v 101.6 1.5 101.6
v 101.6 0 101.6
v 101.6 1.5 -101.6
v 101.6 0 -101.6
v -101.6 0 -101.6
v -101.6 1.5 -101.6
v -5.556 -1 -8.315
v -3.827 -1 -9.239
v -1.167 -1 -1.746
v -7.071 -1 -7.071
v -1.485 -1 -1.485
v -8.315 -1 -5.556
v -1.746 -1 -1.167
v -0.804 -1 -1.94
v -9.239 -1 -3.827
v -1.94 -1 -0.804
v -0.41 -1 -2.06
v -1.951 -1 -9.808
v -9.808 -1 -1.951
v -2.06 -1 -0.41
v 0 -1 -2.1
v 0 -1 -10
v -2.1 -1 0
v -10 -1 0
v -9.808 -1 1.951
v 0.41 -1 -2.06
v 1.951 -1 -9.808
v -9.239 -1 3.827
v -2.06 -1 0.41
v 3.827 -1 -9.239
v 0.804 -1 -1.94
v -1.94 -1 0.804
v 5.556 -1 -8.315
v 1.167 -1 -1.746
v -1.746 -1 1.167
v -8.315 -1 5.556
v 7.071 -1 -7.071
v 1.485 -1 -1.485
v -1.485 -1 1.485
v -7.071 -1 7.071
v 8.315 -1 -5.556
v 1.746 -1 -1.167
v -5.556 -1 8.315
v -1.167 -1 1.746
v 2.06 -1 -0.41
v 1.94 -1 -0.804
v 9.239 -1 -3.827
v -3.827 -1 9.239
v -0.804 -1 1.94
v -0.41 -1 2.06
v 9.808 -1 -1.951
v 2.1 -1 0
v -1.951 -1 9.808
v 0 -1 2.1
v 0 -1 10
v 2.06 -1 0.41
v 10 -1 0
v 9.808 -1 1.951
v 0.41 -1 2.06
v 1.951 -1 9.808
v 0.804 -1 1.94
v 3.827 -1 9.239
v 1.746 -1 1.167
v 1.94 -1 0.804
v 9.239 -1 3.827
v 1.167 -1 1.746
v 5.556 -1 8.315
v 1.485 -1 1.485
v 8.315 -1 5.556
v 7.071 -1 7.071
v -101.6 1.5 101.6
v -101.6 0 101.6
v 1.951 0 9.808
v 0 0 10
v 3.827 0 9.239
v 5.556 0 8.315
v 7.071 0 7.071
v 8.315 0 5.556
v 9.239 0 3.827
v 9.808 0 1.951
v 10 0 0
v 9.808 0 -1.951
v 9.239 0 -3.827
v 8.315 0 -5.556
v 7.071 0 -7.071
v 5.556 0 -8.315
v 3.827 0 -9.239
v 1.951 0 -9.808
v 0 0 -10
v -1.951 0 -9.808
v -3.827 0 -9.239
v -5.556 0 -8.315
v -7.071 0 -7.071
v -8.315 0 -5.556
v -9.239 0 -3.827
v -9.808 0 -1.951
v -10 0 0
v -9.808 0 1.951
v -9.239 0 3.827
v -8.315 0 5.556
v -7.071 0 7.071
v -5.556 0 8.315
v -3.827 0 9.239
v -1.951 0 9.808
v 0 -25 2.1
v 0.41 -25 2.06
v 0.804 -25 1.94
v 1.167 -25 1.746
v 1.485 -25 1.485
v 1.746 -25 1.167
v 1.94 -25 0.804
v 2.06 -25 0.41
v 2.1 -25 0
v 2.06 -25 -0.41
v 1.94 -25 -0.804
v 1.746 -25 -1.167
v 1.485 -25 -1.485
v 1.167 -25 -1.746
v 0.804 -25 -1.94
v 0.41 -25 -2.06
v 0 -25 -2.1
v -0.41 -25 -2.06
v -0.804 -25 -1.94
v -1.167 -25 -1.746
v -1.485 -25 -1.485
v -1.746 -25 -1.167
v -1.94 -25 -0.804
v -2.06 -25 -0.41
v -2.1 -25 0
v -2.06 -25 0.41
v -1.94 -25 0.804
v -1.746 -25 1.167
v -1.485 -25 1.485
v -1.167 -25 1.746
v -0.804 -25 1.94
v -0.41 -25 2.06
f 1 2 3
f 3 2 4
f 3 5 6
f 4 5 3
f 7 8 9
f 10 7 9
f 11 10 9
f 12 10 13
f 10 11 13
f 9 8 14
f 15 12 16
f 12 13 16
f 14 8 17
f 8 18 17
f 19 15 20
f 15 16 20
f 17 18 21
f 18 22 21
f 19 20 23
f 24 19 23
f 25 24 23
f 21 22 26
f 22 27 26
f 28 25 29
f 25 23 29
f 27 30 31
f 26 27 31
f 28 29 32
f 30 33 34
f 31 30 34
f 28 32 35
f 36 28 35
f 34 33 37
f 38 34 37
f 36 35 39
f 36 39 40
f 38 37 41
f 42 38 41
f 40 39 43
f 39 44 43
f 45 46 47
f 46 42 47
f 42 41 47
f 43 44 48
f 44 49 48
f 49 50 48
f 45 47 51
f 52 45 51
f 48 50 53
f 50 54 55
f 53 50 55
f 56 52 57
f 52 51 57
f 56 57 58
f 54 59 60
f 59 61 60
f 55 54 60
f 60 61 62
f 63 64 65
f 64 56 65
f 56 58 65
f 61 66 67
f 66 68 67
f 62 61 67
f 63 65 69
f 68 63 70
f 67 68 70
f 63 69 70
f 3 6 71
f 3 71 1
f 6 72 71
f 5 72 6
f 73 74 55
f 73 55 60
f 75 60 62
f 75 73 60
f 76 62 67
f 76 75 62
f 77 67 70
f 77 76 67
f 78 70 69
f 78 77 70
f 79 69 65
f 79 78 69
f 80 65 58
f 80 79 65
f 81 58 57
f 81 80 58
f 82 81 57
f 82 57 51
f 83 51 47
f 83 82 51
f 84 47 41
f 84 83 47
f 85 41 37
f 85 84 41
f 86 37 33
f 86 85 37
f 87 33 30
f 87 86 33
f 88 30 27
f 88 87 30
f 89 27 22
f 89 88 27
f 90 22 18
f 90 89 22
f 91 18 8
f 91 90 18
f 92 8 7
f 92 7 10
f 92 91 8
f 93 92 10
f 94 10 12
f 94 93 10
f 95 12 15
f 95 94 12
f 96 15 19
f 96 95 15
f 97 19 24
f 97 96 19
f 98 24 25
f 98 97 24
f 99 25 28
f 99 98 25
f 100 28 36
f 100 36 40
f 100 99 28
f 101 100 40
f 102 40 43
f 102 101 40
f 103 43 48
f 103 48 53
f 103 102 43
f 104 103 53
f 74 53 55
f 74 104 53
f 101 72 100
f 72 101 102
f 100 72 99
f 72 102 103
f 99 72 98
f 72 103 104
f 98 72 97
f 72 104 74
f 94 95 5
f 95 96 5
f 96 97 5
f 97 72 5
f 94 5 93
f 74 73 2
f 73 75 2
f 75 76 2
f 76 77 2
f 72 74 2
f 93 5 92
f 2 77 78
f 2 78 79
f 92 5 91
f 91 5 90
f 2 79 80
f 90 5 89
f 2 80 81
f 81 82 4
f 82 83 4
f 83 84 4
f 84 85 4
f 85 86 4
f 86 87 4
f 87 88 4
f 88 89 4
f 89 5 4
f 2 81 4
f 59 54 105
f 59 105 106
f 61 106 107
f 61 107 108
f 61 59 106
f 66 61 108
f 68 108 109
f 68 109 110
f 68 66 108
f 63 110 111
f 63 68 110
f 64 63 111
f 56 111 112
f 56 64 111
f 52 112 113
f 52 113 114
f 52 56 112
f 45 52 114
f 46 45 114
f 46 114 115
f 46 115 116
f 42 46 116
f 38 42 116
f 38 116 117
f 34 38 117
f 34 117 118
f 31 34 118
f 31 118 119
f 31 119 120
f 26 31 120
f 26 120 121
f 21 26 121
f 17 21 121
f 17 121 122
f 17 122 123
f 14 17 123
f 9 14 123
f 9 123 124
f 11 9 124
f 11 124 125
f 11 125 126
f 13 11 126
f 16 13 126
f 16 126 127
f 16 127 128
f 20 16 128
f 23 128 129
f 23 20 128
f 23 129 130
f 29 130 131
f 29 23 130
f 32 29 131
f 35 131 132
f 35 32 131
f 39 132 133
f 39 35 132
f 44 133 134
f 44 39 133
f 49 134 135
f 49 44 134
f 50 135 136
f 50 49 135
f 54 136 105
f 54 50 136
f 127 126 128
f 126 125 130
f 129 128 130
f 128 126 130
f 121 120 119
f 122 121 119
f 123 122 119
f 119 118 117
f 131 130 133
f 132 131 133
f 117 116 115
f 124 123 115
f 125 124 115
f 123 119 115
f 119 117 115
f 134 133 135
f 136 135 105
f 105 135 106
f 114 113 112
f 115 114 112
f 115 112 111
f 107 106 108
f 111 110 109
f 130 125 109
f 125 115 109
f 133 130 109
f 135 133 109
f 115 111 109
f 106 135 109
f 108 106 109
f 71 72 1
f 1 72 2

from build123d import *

# Parameters (mm, degrees)
SKETCH1_R           = 2.1
BOSS_EXTRUDE1_DEPTH = 25
SKETCH2_W           = 203.2
SKETCH2_H           = 203.2
BOSS_EXTRUDE2_DEPTH = 1.5
SKETCH3_R           = 10
BOSS_EXTRUDE3_DEPTH = 1


with BuildPart() as part:
    # Sketch1 → Boss-Extrude1 (new body)
    with BuildSketch(Plane(origin=(0, 0, 0), x_dir=(1, 0, 0), z_dir=(0, 1, 0))):
        with Locations(Location((0, 0, 0), (0, 0, 270))):
            Circle(SKETCH1_R)
    extrude(amount=-BOSS_EXTRUDE1_DEPTH)

    # Sketch2 → Boss-Extrude2 (add)
    with BuildSketch(Plane(origin=(0, 0, 0), x_dir=(1, 0, 0), z_dir=(0, 1, 0))):
        Rectangle(SKETCH2_W, SKETCH2_H)
    extrude(amount=BOSS_EXTRUDE2_DEPTH)

    # Sketch3 → Boss-Extrude3 (add)
    with BuildSketch(Plane(origin=(0, 0, 0), x_dir=(1, 0, 0), z_dir=(0, 1, 0))):
        with Locations(Location((0, 0, 0), (0, 0, 270))):
            Circle(SKETCH3_R)
    extrude(amount=-BOSS_EXTRUDE3_DEPTH)


solid = part.part
